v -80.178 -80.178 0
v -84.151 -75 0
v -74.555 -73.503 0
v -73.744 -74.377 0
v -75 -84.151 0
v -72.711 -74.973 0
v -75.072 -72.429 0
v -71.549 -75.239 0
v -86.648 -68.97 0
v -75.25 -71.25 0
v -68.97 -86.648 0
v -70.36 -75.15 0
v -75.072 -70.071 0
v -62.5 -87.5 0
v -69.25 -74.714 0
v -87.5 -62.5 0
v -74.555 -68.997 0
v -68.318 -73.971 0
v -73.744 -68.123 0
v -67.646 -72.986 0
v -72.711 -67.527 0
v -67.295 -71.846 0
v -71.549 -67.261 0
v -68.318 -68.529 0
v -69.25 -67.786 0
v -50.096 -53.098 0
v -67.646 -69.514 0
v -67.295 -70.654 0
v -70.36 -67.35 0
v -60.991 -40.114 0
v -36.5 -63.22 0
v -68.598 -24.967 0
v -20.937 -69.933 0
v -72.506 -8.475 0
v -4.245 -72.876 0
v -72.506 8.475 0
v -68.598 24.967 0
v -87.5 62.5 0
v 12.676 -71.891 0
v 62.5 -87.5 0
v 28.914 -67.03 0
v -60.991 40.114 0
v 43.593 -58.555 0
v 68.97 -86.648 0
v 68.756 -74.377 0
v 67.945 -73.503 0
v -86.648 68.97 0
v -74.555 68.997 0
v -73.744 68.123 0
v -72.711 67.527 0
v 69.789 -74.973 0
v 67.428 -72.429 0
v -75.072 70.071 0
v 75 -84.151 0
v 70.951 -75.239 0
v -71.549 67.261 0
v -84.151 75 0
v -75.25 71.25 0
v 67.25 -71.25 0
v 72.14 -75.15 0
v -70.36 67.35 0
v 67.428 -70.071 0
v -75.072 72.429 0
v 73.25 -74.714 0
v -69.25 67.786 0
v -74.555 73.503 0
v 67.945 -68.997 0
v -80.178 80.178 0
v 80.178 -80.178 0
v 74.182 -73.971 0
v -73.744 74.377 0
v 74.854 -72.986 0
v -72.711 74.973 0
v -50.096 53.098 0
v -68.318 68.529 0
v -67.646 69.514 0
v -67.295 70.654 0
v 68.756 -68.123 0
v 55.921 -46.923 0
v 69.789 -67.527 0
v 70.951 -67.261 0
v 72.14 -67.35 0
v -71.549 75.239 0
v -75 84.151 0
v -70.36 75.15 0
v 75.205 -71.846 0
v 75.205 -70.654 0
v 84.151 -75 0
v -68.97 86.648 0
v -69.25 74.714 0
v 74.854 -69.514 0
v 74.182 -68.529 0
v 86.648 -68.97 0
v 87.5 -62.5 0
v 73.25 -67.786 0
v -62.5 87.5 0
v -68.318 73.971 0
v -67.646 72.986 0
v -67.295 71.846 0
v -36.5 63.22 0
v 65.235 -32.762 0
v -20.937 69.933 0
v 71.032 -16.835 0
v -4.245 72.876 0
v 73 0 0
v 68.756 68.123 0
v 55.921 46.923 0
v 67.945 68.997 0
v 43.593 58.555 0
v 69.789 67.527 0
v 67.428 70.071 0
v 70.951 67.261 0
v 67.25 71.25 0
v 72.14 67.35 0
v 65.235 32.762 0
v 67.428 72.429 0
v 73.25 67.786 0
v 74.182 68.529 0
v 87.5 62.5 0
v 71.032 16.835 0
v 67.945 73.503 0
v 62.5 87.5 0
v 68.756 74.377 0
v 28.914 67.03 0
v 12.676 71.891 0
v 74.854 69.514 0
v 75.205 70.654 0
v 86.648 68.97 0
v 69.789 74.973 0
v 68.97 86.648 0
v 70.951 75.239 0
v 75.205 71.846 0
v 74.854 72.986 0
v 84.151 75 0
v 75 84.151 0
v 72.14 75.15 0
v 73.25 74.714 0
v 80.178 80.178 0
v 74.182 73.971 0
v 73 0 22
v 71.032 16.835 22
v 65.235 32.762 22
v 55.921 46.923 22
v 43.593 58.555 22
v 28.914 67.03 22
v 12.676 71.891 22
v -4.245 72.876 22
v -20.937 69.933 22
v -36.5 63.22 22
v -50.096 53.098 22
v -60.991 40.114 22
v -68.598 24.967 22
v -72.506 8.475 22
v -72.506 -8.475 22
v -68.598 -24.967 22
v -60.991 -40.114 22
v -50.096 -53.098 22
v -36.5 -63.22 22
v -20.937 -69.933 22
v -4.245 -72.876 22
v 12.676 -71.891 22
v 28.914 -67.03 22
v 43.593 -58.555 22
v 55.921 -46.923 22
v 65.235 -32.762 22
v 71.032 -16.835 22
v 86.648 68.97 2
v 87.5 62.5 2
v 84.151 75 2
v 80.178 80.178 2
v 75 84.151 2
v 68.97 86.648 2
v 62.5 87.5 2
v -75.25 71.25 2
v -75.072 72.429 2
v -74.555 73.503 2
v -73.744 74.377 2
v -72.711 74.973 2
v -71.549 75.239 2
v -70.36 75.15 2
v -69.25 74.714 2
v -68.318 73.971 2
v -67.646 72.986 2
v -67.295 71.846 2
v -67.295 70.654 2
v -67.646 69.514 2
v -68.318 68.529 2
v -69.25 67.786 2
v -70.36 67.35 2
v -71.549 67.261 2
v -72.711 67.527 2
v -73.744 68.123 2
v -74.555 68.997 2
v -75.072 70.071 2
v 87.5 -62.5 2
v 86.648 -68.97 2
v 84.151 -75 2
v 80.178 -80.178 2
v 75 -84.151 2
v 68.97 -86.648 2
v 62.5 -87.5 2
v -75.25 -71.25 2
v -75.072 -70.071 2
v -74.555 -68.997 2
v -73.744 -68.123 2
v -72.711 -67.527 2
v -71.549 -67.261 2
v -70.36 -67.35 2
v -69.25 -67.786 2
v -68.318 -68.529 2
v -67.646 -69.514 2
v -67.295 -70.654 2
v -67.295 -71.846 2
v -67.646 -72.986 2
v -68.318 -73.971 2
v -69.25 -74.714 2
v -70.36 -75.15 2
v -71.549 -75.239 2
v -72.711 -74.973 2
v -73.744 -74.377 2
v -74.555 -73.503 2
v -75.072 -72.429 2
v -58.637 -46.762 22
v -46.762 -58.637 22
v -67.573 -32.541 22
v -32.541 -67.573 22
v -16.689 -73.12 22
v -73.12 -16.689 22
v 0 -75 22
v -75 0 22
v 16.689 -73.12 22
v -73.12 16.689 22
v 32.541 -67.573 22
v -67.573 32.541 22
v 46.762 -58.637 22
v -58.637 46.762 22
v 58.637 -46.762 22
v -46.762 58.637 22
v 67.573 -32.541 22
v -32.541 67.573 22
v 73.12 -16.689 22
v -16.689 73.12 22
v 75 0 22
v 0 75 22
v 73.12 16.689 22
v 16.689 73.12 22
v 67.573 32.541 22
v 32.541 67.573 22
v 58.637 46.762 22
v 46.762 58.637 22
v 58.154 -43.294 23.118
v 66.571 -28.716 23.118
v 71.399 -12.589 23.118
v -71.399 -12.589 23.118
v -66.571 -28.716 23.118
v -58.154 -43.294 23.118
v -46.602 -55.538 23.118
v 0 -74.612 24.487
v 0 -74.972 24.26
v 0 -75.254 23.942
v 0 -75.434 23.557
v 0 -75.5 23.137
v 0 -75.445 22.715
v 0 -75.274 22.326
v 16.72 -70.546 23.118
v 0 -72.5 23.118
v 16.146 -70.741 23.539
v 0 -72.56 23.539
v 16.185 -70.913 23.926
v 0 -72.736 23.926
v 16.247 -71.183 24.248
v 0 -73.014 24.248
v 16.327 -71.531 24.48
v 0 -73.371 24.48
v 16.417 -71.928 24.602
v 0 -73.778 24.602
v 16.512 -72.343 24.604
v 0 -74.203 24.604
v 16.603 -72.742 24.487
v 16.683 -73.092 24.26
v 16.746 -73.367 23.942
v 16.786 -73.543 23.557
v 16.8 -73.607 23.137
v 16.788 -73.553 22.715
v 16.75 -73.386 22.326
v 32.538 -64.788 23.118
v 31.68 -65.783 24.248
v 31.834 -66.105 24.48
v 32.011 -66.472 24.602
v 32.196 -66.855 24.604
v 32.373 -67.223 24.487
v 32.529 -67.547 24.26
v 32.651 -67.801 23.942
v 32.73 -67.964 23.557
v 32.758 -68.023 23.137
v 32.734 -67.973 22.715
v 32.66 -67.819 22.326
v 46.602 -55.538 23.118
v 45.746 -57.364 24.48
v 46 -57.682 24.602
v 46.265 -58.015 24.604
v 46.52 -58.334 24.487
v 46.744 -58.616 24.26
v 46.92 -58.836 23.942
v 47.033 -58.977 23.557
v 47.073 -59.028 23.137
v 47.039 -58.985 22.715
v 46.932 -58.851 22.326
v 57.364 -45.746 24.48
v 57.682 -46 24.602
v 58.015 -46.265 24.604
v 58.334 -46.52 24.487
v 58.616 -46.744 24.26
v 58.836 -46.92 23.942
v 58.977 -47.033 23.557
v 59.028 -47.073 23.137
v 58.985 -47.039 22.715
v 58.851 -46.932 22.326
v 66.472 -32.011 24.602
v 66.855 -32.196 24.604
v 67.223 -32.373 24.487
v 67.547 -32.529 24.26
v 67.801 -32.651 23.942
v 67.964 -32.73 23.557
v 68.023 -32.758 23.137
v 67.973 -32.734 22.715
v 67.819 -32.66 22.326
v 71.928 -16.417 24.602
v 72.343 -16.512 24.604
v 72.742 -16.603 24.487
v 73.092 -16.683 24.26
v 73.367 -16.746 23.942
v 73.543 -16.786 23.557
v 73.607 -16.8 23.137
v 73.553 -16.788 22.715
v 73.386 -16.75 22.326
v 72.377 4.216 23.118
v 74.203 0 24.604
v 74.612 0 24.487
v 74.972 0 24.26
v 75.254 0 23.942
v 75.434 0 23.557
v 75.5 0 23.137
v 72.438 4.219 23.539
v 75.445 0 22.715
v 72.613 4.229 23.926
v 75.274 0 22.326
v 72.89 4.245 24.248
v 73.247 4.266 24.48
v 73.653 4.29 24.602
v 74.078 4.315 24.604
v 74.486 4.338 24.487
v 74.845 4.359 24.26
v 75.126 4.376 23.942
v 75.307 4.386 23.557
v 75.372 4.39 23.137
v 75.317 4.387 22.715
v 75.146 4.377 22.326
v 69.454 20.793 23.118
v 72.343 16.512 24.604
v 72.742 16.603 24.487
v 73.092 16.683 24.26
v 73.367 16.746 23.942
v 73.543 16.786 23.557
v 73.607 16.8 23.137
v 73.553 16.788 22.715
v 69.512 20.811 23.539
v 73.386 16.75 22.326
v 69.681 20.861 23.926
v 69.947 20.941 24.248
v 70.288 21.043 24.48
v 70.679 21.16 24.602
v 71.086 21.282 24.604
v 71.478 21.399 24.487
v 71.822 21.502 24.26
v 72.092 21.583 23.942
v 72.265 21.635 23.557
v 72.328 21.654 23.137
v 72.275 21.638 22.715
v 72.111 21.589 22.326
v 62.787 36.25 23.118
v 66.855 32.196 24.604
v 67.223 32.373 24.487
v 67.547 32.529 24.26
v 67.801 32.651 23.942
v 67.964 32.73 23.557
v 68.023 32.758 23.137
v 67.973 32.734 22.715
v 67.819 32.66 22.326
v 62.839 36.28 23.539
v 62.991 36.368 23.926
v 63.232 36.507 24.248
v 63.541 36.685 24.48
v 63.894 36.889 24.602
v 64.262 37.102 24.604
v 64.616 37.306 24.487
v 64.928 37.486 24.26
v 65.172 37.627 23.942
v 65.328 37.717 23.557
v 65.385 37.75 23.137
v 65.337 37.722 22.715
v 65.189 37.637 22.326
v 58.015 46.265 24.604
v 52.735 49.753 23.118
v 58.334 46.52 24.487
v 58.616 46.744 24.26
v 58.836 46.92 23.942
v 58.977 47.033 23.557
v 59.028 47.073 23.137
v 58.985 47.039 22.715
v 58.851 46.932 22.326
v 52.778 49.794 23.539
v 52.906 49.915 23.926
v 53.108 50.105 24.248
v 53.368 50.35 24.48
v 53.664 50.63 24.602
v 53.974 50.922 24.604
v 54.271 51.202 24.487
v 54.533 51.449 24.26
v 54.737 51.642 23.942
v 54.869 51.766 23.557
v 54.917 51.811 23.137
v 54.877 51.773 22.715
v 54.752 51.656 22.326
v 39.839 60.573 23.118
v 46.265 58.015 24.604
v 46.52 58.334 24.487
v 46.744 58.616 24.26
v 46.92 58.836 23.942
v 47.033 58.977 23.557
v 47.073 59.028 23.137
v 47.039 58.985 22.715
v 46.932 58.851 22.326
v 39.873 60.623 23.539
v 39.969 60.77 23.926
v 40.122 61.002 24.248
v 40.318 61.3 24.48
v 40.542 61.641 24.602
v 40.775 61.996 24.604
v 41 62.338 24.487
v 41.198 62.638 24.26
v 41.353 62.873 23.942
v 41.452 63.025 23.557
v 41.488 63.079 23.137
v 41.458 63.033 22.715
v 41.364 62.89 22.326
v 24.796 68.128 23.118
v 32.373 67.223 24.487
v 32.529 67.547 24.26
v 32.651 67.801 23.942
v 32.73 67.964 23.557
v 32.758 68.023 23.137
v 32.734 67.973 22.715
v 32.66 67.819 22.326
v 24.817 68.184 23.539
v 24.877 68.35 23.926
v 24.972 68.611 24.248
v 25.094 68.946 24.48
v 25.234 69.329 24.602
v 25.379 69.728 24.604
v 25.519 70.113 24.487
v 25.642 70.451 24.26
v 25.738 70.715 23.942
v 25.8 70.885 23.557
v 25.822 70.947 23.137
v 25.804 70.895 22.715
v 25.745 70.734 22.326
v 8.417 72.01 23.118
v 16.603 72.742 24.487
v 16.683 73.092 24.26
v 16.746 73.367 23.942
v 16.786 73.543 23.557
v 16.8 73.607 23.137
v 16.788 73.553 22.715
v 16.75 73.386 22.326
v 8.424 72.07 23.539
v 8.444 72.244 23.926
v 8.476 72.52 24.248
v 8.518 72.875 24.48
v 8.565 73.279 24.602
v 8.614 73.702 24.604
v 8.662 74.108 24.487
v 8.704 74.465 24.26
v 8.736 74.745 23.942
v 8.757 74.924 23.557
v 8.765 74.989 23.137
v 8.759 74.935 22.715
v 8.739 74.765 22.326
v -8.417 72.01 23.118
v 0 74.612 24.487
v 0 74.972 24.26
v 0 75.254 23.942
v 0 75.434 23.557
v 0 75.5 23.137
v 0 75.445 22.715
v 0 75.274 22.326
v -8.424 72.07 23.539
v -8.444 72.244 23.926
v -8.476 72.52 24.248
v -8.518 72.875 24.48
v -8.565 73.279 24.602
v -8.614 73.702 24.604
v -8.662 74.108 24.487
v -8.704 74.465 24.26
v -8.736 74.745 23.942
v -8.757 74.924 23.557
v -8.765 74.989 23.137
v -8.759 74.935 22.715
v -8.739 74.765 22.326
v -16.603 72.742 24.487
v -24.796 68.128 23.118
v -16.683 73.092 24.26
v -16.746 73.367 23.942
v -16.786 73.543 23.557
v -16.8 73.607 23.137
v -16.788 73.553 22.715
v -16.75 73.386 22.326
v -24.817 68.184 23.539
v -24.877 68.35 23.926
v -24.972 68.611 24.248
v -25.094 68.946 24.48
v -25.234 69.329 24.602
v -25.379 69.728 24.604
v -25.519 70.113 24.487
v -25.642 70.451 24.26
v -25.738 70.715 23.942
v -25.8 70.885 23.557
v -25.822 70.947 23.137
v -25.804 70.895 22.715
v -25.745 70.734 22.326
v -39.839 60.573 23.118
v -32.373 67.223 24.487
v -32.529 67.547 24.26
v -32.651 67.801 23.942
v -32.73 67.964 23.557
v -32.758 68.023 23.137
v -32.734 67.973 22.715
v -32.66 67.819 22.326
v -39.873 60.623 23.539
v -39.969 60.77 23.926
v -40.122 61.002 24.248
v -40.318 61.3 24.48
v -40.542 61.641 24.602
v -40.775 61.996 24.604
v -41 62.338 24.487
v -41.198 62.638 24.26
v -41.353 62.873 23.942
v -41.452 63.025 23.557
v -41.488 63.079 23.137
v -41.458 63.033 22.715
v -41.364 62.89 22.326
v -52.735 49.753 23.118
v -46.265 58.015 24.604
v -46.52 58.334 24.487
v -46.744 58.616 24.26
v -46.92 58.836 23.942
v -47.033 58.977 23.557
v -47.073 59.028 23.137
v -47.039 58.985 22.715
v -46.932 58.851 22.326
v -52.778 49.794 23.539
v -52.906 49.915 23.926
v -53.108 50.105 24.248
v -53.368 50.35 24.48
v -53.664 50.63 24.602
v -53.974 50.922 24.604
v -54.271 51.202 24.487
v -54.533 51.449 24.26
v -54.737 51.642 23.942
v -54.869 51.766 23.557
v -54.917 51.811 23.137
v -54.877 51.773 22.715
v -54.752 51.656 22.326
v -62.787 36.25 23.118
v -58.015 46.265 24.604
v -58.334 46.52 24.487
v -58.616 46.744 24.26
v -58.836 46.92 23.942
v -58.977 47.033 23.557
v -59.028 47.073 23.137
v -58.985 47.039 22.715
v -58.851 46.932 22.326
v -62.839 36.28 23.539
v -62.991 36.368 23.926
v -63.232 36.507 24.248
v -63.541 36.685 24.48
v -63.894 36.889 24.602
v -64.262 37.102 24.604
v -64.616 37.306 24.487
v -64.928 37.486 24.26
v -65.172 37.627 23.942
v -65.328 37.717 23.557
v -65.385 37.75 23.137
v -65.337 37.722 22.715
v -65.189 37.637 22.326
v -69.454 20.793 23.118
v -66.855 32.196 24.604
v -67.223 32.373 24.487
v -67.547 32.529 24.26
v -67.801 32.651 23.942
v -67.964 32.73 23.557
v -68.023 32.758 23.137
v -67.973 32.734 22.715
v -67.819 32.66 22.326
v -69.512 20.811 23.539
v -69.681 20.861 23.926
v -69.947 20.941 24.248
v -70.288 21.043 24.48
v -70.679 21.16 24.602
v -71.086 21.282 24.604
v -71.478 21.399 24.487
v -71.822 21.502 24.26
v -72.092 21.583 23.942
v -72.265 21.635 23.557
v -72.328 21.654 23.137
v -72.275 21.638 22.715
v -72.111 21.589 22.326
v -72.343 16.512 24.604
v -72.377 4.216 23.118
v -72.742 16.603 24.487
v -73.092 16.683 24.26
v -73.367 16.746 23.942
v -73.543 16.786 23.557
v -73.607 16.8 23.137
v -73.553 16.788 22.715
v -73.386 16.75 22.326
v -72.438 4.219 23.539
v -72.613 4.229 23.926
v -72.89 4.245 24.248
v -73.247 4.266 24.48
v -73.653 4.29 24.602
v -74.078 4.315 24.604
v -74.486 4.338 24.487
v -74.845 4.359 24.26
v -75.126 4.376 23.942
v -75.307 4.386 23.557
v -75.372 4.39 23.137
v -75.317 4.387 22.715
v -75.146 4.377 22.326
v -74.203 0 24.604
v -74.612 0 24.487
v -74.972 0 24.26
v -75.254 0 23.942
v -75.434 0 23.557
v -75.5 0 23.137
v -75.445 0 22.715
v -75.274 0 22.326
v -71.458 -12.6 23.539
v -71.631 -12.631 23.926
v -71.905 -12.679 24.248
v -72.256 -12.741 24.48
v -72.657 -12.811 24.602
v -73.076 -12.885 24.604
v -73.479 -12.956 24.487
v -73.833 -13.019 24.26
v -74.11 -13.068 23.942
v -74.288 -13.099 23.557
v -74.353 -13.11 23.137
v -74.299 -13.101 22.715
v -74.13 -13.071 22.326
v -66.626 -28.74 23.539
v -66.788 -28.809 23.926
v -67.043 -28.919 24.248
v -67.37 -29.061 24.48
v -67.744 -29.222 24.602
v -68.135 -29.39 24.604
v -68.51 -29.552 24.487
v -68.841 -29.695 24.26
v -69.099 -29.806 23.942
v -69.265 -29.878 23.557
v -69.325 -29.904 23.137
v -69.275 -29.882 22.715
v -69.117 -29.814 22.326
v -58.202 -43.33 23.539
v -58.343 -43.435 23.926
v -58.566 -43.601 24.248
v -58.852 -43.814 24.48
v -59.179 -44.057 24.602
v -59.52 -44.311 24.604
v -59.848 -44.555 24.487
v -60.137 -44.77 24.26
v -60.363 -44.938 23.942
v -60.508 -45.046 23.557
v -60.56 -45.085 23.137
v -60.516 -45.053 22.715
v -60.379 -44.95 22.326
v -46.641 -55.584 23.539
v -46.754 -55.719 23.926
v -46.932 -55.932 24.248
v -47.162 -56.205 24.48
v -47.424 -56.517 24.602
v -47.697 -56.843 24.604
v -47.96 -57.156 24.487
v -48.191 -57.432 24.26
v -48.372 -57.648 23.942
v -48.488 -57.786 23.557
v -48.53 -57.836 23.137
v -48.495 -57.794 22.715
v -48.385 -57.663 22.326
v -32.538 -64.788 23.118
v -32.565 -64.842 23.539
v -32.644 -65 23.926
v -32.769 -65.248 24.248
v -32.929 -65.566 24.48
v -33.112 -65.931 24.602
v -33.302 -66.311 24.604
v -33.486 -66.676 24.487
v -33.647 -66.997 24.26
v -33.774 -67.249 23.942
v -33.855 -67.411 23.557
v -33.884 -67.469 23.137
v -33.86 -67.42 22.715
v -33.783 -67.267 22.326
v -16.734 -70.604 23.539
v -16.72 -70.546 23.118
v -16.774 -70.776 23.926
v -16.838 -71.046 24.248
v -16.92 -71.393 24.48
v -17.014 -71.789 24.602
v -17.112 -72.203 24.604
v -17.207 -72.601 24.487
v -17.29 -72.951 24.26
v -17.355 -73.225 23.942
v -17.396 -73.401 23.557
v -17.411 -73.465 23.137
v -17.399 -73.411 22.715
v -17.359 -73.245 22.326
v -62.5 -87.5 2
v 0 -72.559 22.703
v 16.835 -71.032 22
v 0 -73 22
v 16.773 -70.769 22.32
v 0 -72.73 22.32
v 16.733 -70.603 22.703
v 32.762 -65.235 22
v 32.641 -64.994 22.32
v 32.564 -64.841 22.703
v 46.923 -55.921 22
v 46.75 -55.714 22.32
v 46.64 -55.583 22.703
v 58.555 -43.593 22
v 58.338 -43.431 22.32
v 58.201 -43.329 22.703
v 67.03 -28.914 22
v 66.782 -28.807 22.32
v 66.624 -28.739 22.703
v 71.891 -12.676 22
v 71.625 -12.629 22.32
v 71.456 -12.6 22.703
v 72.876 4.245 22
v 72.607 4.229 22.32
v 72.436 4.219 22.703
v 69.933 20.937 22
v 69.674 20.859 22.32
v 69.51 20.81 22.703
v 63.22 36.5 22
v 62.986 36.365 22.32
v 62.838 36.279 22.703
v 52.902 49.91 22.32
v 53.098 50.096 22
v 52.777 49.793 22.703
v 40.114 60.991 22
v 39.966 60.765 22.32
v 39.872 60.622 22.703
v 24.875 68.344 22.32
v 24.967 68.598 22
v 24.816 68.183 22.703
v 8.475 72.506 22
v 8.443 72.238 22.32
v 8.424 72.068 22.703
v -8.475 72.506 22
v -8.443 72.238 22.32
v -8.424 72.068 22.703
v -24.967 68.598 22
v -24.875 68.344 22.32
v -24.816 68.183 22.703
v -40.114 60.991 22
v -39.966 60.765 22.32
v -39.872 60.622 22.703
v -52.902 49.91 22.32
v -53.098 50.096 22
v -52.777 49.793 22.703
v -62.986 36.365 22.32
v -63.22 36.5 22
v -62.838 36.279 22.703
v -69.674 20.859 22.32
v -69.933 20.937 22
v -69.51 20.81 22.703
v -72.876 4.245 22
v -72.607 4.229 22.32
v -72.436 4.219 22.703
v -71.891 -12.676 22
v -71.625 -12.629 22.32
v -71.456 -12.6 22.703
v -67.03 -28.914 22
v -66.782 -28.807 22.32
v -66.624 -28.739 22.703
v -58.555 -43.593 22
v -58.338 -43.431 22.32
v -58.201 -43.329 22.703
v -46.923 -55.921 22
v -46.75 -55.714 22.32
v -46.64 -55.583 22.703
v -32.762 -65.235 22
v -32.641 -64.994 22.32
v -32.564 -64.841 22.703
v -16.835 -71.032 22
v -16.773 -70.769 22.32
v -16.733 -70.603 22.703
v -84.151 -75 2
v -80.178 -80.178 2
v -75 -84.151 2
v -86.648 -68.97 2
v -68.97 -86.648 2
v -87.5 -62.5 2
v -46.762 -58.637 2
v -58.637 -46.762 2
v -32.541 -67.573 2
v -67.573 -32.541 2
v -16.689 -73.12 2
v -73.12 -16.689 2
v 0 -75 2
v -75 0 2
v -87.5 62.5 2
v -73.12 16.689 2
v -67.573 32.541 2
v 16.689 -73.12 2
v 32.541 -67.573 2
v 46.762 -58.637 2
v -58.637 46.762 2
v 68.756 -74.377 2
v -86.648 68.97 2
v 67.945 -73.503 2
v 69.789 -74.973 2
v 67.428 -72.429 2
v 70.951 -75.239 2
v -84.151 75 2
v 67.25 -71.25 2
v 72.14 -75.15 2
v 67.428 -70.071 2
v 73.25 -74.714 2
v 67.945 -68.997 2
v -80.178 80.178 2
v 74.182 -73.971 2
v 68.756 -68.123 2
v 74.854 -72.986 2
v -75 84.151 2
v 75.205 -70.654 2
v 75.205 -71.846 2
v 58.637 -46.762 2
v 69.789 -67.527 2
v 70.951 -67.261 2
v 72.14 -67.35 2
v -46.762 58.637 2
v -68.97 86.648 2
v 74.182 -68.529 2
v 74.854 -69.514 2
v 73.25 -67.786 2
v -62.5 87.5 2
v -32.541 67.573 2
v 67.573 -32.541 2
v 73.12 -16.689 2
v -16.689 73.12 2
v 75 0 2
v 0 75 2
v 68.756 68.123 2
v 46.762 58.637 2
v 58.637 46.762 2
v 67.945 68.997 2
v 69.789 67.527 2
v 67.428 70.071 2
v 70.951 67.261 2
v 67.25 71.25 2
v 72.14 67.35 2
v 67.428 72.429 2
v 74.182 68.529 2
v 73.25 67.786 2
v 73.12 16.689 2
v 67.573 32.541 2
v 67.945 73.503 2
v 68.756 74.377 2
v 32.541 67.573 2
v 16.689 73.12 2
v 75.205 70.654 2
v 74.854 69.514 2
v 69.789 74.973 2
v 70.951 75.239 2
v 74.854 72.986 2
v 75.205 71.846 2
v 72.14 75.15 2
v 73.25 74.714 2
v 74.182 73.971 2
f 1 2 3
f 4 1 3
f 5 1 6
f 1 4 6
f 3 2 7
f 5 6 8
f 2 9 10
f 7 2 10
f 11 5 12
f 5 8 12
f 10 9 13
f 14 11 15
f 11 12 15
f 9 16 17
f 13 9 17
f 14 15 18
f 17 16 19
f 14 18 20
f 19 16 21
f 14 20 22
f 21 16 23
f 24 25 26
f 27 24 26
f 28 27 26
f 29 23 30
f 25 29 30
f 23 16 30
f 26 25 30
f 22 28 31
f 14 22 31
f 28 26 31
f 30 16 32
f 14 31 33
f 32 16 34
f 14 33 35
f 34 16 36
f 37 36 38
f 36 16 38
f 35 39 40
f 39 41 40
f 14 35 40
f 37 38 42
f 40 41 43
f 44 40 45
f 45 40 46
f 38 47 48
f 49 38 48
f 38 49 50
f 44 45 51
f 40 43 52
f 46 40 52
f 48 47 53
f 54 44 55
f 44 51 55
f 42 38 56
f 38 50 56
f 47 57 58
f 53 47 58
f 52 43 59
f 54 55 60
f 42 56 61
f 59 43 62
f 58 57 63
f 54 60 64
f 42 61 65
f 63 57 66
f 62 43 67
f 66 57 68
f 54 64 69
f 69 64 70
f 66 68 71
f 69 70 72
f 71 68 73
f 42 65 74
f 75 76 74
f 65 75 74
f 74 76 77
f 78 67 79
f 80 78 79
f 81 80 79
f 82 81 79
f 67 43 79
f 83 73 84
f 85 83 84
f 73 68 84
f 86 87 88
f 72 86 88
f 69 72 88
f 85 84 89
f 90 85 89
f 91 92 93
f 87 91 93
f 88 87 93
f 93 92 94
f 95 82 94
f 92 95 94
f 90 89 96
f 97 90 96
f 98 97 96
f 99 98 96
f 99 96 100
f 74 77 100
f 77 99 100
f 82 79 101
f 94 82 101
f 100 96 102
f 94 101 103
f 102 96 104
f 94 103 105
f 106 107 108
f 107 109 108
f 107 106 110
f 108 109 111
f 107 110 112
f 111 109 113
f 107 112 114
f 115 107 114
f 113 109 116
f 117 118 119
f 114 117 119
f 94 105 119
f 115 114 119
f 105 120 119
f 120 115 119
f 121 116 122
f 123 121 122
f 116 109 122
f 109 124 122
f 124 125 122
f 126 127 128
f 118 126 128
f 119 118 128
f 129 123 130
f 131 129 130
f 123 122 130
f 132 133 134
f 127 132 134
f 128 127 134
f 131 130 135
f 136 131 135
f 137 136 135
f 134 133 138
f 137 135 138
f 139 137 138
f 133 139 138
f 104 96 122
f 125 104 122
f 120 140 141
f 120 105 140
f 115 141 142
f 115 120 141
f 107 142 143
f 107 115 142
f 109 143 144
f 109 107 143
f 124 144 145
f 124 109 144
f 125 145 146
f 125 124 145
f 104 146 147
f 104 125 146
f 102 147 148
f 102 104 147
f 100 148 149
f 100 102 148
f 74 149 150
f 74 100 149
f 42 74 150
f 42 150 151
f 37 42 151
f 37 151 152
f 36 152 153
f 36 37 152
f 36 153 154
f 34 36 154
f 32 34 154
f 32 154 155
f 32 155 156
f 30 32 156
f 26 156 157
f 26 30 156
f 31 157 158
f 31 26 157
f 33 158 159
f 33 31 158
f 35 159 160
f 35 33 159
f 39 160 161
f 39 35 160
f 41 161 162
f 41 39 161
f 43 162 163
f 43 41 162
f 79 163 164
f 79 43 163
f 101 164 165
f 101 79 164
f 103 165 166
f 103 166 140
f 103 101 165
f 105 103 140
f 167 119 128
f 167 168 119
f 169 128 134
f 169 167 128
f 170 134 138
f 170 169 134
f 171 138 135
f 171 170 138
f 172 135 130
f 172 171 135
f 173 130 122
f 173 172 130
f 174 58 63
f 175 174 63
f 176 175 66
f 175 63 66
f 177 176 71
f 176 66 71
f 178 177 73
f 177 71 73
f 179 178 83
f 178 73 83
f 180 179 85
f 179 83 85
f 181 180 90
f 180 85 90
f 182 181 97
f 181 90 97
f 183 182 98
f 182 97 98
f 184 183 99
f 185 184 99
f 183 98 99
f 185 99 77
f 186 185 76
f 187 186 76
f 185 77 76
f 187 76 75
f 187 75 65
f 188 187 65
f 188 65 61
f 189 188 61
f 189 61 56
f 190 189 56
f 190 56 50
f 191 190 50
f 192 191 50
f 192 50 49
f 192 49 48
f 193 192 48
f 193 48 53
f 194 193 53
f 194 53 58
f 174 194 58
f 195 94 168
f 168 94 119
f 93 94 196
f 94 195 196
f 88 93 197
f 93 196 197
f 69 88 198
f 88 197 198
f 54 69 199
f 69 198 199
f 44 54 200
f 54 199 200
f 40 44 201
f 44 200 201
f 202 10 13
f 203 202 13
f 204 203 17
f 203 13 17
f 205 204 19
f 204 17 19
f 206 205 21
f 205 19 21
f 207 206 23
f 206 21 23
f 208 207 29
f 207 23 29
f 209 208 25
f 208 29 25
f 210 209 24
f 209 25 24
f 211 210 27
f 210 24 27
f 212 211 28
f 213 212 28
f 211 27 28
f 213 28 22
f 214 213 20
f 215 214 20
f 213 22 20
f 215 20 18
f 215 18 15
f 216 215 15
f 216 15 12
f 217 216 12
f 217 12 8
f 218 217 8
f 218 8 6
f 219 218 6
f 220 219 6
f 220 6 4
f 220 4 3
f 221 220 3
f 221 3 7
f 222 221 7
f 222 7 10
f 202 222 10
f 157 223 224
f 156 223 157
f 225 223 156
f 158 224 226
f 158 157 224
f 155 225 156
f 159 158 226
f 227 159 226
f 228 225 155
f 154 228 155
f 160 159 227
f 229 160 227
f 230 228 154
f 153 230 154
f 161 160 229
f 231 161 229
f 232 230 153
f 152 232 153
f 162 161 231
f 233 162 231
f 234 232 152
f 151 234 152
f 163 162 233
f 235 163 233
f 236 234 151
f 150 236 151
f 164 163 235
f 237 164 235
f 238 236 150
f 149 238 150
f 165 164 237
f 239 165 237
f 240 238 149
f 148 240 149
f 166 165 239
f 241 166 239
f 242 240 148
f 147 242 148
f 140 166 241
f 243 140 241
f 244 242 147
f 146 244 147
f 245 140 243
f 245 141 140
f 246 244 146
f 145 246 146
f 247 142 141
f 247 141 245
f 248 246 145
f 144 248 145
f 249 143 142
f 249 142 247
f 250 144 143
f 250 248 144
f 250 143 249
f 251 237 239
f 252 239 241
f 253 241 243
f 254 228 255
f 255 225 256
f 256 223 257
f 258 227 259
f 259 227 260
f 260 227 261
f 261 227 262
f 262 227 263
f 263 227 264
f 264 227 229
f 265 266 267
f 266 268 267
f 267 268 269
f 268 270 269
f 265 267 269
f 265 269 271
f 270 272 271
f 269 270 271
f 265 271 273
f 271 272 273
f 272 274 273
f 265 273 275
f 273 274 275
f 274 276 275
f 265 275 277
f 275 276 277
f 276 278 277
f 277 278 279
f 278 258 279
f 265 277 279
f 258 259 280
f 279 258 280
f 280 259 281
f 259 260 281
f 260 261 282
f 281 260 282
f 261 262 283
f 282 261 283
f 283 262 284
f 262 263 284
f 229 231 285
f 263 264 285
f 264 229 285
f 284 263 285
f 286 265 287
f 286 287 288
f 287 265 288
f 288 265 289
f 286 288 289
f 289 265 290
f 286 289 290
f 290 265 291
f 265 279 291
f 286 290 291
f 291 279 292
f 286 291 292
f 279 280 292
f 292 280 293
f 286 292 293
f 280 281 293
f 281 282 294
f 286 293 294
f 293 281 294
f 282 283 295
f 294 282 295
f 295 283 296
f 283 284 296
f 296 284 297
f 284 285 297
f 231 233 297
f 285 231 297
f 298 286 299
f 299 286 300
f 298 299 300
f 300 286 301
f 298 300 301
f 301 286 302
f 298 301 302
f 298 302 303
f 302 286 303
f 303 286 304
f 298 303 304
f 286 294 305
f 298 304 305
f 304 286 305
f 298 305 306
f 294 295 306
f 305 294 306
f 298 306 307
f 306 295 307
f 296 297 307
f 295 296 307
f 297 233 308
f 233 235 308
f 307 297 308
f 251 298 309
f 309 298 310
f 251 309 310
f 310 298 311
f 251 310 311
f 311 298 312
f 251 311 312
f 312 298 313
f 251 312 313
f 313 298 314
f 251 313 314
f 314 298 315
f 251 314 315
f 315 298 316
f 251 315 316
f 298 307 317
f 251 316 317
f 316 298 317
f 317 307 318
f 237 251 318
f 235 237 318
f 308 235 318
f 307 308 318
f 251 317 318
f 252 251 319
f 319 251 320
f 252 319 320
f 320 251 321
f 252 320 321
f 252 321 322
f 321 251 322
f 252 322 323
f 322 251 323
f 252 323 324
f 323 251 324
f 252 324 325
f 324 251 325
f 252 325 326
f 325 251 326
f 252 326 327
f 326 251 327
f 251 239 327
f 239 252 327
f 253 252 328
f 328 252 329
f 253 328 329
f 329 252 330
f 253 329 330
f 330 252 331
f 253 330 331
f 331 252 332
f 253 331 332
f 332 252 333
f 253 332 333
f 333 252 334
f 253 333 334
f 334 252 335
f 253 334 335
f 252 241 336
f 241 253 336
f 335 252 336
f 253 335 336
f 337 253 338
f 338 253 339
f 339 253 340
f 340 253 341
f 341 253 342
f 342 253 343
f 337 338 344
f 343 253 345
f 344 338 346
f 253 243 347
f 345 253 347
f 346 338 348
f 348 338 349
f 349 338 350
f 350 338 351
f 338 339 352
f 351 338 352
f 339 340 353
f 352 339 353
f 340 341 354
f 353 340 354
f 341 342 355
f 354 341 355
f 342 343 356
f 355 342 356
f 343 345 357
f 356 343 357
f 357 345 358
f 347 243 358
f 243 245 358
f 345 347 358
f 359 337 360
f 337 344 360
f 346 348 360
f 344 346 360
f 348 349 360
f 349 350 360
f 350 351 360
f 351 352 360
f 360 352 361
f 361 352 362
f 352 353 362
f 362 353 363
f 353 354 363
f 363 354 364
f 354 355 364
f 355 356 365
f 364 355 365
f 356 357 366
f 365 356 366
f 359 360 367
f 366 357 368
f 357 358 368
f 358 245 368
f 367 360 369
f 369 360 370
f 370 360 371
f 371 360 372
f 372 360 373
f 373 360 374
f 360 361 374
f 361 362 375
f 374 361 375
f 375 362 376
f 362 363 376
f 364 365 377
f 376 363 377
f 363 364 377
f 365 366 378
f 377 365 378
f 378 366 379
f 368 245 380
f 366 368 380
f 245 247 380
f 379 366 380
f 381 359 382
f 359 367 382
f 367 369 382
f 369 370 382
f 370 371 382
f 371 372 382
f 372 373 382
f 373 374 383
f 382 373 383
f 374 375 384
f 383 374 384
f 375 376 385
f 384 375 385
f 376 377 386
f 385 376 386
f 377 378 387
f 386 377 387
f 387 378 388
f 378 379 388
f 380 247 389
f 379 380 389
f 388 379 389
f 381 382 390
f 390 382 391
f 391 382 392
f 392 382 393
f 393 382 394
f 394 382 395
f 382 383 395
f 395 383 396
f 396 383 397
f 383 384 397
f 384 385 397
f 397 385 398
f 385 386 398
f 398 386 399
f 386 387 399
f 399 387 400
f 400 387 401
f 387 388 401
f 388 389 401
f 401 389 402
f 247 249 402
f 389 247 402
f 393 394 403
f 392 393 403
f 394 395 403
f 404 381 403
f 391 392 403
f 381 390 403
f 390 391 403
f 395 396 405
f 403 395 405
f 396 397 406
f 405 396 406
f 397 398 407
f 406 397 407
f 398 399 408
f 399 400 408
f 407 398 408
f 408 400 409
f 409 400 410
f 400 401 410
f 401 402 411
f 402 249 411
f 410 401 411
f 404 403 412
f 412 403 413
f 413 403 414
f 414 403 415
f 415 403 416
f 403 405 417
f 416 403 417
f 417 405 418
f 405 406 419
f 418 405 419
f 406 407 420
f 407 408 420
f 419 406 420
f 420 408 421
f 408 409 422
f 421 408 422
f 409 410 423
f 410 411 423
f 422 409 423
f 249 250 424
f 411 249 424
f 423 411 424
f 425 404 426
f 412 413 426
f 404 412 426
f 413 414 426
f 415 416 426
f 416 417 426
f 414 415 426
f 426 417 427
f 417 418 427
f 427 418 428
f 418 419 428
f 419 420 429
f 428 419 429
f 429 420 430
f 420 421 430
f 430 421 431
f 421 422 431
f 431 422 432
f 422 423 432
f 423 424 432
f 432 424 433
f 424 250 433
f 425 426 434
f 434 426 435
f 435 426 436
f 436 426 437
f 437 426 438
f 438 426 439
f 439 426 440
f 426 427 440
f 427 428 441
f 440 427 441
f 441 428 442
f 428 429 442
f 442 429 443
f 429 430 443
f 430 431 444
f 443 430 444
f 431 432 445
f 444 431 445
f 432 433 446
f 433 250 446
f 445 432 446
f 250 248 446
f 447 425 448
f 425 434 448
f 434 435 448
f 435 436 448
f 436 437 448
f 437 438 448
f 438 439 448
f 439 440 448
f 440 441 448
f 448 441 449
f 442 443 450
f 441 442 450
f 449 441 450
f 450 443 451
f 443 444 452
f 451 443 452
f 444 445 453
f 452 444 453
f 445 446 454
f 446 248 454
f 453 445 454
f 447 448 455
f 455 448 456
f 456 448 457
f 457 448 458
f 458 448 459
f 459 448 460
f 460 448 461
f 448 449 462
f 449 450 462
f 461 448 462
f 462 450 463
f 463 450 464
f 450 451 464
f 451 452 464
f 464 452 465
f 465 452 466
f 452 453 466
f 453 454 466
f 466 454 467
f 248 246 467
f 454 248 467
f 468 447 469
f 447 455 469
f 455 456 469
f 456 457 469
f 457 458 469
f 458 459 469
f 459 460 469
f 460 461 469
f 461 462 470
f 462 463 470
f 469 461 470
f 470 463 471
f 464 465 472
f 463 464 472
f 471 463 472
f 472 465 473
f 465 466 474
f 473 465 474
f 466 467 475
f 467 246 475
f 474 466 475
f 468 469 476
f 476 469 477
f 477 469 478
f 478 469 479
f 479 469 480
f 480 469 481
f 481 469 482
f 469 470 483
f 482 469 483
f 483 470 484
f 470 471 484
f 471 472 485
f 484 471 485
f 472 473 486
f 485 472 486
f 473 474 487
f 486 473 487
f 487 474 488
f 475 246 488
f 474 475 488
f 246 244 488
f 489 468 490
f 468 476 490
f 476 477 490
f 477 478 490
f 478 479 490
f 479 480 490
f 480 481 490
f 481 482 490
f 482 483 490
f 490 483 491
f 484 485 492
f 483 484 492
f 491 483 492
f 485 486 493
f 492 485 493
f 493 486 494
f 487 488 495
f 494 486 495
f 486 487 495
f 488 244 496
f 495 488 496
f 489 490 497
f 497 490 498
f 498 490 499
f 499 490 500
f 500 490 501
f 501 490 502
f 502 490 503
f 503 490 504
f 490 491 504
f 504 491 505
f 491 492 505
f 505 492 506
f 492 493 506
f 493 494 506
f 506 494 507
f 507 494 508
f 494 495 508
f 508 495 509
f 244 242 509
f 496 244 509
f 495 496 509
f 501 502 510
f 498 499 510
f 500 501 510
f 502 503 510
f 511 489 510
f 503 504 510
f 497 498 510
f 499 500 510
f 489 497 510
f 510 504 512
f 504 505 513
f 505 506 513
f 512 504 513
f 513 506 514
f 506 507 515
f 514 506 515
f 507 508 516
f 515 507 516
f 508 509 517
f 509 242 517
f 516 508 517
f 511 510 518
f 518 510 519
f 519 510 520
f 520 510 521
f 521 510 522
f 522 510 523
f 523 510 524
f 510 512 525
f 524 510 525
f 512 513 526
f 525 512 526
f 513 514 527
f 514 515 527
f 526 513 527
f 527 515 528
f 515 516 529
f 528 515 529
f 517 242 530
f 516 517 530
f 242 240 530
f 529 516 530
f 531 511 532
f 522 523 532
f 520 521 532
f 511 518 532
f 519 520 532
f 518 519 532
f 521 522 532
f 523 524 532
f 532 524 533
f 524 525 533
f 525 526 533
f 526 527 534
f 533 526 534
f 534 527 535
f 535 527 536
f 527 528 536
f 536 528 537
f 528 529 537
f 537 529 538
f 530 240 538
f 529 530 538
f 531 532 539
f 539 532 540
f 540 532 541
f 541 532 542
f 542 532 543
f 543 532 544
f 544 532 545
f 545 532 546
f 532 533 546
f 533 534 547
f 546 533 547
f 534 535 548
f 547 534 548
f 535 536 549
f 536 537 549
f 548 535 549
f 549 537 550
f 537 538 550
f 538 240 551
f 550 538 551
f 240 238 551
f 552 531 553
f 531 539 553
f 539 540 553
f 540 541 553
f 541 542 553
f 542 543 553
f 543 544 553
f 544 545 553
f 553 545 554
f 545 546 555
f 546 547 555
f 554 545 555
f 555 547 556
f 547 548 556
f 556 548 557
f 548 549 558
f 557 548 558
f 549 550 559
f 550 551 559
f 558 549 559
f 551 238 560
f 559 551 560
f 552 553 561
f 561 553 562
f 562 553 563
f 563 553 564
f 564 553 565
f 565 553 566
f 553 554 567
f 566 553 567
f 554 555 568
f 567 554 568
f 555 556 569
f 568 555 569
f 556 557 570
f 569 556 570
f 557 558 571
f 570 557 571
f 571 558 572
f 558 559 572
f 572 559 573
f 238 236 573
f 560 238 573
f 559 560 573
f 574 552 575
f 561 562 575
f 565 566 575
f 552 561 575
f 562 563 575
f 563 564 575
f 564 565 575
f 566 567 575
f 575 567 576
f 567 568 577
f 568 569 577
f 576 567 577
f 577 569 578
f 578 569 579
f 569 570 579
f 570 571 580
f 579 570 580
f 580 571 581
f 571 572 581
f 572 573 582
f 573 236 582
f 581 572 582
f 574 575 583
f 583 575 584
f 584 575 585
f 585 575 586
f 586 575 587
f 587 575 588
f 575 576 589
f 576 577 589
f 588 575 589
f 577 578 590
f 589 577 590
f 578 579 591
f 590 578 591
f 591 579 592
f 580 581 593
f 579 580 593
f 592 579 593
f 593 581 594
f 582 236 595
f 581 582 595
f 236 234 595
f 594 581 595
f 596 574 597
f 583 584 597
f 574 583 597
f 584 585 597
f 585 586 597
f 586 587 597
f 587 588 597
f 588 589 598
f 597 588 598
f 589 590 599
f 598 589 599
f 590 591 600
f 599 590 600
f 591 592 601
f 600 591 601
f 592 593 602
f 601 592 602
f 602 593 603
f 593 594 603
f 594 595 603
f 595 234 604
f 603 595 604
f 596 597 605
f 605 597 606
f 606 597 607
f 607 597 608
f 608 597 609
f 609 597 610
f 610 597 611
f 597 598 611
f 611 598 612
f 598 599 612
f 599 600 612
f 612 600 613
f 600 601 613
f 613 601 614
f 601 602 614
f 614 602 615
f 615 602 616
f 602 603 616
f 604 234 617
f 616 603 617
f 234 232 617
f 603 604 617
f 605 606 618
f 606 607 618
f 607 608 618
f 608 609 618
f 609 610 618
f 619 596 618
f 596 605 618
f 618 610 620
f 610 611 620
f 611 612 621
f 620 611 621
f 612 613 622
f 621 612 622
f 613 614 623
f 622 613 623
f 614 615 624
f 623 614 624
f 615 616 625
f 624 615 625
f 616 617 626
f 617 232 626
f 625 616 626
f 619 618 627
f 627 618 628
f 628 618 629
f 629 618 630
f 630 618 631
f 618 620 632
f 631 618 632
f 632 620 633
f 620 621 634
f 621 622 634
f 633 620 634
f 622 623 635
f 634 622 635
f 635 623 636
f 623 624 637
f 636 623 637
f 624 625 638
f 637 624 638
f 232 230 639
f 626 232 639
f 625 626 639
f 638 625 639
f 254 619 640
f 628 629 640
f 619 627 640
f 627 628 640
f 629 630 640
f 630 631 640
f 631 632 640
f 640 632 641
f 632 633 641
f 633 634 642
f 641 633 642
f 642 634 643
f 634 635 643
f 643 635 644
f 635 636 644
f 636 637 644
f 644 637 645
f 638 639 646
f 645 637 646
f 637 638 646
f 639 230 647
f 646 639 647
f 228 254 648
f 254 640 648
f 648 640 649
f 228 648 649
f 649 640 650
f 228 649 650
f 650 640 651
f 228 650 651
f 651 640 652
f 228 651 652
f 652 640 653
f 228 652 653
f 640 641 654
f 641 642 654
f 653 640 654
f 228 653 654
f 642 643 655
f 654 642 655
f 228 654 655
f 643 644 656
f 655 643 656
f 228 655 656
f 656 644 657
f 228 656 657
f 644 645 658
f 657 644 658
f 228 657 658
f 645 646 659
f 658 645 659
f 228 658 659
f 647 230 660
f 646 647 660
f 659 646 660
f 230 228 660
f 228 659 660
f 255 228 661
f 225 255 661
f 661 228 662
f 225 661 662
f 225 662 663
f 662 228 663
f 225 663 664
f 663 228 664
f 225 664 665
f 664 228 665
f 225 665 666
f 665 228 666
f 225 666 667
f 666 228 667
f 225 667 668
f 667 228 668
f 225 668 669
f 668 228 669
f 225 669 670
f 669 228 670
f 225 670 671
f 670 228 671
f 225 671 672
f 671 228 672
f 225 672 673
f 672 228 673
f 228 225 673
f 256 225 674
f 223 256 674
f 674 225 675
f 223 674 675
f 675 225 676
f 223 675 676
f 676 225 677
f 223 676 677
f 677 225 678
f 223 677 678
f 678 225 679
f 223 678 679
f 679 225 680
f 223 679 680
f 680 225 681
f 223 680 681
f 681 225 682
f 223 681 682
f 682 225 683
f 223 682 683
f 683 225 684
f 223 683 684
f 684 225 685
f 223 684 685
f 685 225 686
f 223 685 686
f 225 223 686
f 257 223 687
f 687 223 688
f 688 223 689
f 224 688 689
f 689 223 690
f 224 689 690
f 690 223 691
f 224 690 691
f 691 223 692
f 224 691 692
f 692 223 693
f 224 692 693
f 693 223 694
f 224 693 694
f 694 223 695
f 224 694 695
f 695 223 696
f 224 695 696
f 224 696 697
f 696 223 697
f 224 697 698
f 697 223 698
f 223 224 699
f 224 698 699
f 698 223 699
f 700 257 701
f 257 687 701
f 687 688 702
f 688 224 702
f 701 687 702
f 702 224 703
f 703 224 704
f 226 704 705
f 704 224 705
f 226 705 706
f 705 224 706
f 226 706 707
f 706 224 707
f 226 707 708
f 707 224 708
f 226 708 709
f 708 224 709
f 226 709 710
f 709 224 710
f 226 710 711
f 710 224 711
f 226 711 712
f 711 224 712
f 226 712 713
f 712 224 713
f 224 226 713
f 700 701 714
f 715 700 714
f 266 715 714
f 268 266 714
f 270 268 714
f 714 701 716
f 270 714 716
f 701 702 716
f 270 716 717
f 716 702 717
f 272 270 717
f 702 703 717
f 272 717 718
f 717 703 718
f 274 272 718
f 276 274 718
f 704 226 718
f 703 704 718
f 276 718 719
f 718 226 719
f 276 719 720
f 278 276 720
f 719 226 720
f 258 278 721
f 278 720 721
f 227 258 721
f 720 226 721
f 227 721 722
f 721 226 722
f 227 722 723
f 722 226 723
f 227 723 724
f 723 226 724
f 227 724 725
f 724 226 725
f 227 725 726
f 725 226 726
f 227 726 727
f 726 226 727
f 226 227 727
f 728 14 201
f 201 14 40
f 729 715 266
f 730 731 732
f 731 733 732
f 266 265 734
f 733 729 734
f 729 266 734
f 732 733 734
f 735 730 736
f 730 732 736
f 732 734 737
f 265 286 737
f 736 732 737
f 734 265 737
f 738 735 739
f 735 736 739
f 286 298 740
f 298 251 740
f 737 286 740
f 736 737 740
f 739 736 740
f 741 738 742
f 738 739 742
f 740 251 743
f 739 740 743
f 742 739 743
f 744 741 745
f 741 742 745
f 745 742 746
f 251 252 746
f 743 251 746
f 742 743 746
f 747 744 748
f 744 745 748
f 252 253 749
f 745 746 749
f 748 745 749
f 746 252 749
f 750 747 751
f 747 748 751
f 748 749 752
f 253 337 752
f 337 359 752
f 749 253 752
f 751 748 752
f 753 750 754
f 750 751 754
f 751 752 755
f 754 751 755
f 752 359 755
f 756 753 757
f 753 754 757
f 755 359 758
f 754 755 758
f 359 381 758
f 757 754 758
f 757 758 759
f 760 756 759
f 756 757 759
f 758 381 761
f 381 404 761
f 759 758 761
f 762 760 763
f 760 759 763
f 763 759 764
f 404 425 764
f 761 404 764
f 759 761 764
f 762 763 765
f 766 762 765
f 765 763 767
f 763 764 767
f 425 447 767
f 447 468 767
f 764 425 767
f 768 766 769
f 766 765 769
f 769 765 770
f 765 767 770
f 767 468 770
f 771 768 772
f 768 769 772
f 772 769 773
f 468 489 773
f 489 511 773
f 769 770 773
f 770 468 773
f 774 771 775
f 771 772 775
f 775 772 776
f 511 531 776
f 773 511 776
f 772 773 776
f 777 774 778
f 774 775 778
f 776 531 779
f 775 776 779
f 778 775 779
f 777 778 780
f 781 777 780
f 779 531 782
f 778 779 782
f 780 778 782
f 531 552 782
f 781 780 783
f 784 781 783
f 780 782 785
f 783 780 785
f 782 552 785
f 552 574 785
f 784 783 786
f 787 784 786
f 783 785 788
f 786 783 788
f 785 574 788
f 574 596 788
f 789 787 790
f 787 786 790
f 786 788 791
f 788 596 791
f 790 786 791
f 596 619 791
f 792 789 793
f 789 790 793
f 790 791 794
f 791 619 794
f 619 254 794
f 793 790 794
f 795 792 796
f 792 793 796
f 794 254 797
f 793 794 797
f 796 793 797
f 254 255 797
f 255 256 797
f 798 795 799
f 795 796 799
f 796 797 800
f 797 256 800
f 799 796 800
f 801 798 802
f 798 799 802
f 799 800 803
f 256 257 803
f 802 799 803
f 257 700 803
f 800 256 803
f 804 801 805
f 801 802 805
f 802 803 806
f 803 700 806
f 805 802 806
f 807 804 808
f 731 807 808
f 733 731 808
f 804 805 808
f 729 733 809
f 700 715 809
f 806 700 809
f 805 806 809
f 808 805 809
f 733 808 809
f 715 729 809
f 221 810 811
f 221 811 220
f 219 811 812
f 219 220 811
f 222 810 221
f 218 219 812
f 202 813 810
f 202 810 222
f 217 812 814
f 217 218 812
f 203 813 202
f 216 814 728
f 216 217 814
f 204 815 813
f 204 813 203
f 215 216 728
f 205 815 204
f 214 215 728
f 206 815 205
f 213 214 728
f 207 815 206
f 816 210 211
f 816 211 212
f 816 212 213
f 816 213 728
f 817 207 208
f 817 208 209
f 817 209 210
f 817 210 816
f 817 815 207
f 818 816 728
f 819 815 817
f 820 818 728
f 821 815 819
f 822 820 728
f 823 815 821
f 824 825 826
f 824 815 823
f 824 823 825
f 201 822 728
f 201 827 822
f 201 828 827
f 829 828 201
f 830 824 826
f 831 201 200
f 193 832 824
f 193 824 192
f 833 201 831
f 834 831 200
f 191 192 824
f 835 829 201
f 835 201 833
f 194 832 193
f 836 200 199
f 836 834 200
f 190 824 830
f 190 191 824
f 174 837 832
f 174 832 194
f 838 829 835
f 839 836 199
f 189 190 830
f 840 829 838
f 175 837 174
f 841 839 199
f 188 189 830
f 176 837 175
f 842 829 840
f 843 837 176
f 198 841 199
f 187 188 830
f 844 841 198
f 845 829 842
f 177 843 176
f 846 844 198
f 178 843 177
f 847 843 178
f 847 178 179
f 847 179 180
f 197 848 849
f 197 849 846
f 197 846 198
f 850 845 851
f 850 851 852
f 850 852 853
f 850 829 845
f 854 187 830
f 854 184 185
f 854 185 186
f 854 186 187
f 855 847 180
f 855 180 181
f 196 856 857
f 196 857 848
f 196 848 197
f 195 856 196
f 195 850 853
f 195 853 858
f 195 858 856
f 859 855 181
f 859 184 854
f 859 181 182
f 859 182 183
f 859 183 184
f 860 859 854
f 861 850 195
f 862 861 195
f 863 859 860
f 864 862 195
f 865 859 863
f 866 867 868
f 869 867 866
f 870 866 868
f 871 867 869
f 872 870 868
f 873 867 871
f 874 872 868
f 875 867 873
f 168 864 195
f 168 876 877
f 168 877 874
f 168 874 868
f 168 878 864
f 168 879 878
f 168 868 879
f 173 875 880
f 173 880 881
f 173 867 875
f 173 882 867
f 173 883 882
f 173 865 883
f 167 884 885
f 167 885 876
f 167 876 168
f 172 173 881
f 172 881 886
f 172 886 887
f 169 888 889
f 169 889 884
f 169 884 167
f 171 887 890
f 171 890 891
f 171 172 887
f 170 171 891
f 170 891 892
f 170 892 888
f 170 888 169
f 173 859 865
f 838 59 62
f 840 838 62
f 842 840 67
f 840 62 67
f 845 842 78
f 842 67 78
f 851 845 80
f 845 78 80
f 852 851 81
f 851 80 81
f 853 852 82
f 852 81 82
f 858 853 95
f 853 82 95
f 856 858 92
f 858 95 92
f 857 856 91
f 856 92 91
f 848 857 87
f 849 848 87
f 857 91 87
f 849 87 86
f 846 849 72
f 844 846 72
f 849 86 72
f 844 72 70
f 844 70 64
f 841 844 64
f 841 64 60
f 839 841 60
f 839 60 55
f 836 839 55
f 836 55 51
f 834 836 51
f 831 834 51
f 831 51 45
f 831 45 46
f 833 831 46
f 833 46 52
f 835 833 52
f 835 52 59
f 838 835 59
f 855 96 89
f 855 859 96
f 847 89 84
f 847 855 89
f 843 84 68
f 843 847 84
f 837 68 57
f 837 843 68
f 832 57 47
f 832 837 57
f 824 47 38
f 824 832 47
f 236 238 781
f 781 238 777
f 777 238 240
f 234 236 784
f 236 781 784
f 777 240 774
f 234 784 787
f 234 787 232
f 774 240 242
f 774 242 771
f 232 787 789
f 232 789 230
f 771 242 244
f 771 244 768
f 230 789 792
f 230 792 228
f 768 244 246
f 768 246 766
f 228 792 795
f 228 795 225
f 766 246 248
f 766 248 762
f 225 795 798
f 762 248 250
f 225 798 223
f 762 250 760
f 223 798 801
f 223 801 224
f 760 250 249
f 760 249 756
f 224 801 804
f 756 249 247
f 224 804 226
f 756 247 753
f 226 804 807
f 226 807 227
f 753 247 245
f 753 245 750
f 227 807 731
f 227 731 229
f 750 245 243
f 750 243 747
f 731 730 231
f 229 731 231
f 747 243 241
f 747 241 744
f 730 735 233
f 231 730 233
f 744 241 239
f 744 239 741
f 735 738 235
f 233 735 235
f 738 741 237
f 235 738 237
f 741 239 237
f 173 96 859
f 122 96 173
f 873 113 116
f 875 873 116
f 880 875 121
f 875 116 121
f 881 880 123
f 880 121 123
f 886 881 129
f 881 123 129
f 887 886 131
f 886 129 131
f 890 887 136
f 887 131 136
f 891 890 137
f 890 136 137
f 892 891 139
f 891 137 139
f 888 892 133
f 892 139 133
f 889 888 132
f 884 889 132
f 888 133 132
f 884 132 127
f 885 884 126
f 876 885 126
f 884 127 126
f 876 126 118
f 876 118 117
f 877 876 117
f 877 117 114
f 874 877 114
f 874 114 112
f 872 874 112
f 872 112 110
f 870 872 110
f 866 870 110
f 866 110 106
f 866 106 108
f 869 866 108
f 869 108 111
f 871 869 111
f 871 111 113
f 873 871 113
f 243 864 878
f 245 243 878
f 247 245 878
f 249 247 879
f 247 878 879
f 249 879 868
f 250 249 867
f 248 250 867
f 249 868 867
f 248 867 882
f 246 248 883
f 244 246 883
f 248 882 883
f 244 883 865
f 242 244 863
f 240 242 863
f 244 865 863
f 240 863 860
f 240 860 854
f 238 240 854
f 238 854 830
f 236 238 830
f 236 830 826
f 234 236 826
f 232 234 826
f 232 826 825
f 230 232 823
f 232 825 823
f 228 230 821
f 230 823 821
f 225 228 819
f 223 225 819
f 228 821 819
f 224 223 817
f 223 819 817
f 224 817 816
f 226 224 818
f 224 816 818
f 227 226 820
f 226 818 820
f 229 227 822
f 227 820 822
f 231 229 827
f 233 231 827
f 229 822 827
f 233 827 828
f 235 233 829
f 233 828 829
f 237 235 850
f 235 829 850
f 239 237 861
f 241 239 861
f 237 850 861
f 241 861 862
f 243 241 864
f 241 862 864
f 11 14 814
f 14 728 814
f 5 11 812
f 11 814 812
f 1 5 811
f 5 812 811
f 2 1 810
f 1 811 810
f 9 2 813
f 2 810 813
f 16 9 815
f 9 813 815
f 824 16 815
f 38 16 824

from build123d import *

# Parameters (mm, degrees)
F0_W     = 175
F0_H     = 175
F0_R     = 73
F1_DEPTH = 2
F2_R     = 75
F2_R_2   = 73
F3_DEPTH = 20
F6_R     = 25
F8_D     = 8


with BuildPart() as f1:
    # F0 (on Top) → F1 (new body)
    with BuildSketch(Plane.XY):
        Rectangle(F0_W, F0_H)
        Circle(F0_R, mode=Mode.SUBTRACT)
    extrude(amount=F1_DEPTH)

    # F2 (on face) → F3 (join)
    with BuildSketch(Plane.XY.offset(2)):
        Circle(F2_R)
        Circle(F2_R_2, mode=Mode.SUBTRACT)
    extrude(amount=F3_DEPTH)

    # F6
    f6_edges = [f1.edges().sort_by_distance(p)[0] for p in [
        (-87.5, -87.5, 1),
        (87.5, -87.5, 1),
        (87.5, 87.5, 1),
        (-87.5, 87.5, 1),
    ]]
    fillet(f6_edges, radius=F6_R)

    # F8 (through all)
    with Locations(Plane.XY.offset(2)):
        with Locations((-71.25, 71.25), (71.25, 71.25), (71.25, -71.25), (-71.25, -71.25)):
            Hole(F8_D / 2)


with BuildPart() as f5:
    # F4 (on Right) → F5 (revolve)
    with BuildSketch(Plane.YZ):
        with BuildLine():
            Line((-75, 22), (-73, 22))
            ThreePointArc((-73, 22), (-72.630694, 22.505662), (-72.5, 23.118034))
            ThreePointArc((-72.5, 23.118034), (-74.612372, 24.48734), (-75, 22))
        make_face()
    revolve(axis=Axis((0, 0, 16.390443), (0, 0, 1)))


solid = Compound([f1.part, f5.part])
